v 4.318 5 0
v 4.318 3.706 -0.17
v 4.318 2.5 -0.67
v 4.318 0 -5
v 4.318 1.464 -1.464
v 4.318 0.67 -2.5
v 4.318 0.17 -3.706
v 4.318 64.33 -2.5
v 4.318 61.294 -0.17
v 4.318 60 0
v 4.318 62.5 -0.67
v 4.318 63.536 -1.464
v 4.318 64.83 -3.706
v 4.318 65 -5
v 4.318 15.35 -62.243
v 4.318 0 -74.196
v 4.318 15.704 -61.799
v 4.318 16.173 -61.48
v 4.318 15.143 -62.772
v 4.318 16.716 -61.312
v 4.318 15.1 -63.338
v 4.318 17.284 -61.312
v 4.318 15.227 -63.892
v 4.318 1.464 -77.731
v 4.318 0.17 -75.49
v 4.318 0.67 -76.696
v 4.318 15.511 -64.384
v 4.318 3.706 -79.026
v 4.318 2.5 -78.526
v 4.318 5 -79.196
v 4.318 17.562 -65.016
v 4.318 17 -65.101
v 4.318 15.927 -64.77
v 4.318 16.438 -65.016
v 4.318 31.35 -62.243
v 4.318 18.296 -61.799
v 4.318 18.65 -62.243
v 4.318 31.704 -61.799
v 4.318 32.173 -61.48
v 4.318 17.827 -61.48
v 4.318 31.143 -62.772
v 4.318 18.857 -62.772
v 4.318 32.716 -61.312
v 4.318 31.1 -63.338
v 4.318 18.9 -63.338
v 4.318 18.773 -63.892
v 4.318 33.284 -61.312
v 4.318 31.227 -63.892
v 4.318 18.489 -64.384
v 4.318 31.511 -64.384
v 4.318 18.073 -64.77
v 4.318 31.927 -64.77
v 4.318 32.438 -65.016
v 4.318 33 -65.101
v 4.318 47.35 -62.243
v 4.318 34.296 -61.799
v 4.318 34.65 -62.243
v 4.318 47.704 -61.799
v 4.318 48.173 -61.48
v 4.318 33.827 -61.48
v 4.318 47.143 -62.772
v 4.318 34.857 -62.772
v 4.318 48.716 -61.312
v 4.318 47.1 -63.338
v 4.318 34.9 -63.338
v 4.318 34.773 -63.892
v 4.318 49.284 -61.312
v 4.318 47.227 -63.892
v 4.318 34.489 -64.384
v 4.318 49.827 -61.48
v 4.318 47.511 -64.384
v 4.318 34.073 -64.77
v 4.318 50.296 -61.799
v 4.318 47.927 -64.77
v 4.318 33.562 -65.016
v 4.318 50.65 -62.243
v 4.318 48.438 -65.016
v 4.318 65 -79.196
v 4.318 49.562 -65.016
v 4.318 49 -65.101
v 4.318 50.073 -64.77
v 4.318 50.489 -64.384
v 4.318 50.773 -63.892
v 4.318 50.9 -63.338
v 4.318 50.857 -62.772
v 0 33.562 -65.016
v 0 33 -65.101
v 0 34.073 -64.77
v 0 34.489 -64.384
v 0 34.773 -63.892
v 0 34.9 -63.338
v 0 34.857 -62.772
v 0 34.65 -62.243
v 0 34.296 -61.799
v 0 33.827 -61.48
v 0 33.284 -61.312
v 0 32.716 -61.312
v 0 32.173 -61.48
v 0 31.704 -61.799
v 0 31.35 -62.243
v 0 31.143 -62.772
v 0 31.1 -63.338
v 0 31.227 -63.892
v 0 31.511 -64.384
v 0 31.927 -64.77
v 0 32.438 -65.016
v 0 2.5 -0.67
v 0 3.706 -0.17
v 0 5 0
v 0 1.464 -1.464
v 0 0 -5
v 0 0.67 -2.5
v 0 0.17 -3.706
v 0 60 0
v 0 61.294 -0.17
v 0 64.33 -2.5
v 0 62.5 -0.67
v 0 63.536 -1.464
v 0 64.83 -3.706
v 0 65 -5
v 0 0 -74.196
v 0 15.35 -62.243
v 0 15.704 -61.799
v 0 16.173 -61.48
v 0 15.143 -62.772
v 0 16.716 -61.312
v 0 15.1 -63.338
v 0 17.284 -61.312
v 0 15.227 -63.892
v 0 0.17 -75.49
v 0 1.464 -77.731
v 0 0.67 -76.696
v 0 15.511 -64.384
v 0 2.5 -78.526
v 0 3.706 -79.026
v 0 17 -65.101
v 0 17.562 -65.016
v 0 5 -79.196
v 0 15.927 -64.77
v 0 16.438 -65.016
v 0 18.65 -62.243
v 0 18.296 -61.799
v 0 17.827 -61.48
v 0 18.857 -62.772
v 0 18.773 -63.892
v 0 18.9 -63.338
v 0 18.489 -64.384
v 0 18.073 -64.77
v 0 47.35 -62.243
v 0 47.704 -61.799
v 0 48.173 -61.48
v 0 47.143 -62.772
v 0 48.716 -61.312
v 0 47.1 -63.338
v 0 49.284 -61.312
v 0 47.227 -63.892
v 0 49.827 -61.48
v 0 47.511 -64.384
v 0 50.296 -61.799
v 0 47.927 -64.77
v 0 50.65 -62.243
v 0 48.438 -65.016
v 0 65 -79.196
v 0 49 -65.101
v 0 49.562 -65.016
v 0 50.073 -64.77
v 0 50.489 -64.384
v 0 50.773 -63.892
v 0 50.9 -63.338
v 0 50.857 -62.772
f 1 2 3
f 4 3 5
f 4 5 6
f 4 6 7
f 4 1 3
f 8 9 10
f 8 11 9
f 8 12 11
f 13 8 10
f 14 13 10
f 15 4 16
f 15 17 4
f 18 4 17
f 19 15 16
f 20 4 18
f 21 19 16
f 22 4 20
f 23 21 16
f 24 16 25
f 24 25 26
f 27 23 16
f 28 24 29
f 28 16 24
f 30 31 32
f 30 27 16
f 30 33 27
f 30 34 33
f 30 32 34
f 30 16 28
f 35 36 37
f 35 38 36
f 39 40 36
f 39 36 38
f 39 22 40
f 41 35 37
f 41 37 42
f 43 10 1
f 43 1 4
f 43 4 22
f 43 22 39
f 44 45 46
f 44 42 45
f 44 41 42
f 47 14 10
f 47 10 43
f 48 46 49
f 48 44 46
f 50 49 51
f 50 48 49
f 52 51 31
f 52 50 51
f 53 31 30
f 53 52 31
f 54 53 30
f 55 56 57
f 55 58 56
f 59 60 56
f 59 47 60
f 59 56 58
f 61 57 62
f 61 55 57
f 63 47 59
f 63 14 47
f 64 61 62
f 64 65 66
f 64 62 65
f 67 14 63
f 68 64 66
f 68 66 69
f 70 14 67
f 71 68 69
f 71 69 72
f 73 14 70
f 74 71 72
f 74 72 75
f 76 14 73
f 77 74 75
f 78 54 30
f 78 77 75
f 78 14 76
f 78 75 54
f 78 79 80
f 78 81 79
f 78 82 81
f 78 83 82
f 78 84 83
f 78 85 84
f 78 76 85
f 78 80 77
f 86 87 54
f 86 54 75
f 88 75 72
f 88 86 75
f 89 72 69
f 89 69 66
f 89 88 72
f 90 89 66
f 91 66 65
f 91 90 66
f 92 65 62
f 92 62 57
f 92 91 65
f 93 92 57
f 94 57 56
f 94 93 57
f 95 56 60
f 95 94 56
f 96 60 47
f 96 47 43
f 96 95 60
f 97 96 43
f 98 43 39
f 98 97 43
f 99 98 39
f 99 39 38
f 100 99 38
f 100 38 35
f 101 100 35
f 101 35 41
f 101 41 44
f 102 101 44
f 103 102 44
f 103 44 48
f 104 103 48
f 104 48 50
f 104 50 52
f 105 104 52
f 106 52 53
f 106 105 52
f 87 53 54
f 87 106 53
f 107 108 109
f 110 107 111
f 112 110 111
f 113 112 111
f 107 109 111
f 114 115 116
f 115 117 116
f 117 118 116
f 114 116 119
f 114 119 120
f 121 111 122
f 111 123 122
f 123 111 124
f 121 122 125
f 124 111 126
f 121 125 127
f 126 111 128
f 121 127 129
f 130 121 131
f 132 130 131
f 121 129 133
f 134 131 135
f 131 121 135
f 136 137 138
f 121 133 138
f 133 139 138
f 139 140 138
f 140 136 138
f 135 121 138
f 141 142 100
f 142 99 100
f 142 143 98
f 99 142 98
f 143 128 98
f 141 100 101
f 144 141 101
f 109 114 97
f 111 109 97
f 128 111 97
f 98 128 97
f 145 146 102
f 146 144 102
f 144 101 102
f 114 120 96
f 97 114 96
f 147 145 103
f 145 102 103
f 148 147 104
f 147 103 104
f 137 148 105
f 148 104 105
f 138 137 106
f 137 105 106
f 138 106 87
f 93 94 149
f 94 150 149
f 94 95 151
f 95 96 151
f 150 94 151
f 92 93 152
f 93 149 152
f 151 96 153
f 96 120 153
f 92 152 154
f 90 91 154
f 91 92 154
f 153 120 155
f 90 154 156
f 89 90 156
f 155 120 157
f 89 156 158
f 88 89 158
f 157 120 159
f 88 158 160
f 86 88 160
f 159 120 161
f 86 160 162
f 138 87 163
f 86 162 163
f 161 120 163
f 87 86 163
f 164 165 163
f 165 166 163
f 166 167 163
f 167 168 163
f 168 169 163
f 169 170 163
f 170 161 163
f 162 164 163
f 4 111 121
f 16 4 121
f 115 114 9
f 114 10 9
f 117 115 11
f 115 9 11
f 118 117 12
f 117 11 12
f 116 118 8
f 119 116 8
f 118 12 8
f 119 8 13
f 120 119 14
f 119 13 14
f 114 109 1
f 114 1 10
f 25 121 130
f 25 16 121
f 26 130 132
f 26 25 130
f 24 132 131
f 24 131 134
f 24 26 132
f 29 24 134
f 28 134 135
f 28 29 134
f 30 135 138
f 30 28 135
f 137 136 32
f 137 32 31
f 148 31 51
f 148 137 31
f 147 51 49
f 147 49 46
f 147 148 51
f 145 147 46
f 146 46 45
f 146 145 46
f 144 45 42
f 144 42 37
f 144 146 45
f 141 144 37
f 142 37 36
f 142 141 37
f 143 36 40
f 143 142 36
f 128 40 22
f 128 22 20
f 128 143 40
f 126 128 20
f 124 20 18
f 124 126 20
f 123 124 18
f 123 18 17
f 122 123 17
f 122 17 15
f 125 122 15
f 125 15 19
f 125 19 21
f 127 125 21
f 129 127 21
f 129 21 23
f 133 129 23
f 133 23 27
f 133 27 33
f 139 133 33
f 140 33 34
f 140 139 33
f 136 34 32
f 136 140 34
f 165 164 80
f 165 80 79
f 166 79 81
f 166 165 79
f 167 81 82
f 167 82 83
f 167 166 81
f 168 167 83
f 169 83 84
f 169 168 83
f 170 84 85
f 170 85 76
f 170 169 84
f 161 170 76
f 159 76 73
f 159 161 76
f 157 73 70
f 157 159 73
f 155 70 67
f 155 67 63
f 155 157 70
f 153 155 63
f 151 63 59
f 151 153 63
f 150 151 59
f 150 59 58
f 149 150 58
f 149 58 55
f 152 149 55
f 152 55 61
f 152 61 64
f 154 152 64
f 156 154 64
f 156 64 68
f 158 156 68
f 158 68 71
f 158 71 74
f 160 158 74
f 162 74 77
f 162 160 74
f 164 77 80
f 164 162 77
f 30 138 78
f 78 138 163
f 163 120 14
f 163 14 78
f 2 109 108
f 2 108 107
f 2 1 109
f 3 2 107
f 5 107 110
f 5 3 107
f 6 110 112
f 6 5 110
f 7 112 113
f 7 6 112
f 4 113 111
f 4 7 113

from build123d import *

# Parameters (mm, degrees)
SKETCH1_W           = 79.195959493
SKETCH1_H           = 65
SKETCH1_R           = 1.905
BOSS_EXTRUDE1_DEPTH = 4.318
FILLET1_R           = 5


with BuildPart() as part:
    # Sketch1 → Boss-Extrude1 (new body)
    with BuildSketch(Plane(origin=(0, 0, 0), x_dir=(0, 0, -1), z_dir=(1, 0, 0))):
        with Locations((39.597979747, 32.5)):
            Rectangle(SKETCH1_W, SKETCH1_H)
        with Locations((63.195959493, 49)):
            Circle(SKETCH1_R, mode=Mode.SUBTRACT)
        with Locations((63.195959493, 33)):
            Circle(SKETCH1_R, mode=Mode.SUBTRACT)
        with Locations((63.195959493, 17)):
            Circle(SKETCH1_R, mode=Mode.SUBTRACT)
    extrude(amount=BOSS_EXTRUDE1_DEPTH)

    # Fillet1
    fillet1_edges = [part.edges().sort_by_distance(p)[0] for p in [
        (2.159, 65, 0),
        (2.159, 0, -79.195959493),
        (2.159, 0, 0),
    ]]
    fillet(fillet1_edges, radius=FILLET1_R)


solid = part.part
